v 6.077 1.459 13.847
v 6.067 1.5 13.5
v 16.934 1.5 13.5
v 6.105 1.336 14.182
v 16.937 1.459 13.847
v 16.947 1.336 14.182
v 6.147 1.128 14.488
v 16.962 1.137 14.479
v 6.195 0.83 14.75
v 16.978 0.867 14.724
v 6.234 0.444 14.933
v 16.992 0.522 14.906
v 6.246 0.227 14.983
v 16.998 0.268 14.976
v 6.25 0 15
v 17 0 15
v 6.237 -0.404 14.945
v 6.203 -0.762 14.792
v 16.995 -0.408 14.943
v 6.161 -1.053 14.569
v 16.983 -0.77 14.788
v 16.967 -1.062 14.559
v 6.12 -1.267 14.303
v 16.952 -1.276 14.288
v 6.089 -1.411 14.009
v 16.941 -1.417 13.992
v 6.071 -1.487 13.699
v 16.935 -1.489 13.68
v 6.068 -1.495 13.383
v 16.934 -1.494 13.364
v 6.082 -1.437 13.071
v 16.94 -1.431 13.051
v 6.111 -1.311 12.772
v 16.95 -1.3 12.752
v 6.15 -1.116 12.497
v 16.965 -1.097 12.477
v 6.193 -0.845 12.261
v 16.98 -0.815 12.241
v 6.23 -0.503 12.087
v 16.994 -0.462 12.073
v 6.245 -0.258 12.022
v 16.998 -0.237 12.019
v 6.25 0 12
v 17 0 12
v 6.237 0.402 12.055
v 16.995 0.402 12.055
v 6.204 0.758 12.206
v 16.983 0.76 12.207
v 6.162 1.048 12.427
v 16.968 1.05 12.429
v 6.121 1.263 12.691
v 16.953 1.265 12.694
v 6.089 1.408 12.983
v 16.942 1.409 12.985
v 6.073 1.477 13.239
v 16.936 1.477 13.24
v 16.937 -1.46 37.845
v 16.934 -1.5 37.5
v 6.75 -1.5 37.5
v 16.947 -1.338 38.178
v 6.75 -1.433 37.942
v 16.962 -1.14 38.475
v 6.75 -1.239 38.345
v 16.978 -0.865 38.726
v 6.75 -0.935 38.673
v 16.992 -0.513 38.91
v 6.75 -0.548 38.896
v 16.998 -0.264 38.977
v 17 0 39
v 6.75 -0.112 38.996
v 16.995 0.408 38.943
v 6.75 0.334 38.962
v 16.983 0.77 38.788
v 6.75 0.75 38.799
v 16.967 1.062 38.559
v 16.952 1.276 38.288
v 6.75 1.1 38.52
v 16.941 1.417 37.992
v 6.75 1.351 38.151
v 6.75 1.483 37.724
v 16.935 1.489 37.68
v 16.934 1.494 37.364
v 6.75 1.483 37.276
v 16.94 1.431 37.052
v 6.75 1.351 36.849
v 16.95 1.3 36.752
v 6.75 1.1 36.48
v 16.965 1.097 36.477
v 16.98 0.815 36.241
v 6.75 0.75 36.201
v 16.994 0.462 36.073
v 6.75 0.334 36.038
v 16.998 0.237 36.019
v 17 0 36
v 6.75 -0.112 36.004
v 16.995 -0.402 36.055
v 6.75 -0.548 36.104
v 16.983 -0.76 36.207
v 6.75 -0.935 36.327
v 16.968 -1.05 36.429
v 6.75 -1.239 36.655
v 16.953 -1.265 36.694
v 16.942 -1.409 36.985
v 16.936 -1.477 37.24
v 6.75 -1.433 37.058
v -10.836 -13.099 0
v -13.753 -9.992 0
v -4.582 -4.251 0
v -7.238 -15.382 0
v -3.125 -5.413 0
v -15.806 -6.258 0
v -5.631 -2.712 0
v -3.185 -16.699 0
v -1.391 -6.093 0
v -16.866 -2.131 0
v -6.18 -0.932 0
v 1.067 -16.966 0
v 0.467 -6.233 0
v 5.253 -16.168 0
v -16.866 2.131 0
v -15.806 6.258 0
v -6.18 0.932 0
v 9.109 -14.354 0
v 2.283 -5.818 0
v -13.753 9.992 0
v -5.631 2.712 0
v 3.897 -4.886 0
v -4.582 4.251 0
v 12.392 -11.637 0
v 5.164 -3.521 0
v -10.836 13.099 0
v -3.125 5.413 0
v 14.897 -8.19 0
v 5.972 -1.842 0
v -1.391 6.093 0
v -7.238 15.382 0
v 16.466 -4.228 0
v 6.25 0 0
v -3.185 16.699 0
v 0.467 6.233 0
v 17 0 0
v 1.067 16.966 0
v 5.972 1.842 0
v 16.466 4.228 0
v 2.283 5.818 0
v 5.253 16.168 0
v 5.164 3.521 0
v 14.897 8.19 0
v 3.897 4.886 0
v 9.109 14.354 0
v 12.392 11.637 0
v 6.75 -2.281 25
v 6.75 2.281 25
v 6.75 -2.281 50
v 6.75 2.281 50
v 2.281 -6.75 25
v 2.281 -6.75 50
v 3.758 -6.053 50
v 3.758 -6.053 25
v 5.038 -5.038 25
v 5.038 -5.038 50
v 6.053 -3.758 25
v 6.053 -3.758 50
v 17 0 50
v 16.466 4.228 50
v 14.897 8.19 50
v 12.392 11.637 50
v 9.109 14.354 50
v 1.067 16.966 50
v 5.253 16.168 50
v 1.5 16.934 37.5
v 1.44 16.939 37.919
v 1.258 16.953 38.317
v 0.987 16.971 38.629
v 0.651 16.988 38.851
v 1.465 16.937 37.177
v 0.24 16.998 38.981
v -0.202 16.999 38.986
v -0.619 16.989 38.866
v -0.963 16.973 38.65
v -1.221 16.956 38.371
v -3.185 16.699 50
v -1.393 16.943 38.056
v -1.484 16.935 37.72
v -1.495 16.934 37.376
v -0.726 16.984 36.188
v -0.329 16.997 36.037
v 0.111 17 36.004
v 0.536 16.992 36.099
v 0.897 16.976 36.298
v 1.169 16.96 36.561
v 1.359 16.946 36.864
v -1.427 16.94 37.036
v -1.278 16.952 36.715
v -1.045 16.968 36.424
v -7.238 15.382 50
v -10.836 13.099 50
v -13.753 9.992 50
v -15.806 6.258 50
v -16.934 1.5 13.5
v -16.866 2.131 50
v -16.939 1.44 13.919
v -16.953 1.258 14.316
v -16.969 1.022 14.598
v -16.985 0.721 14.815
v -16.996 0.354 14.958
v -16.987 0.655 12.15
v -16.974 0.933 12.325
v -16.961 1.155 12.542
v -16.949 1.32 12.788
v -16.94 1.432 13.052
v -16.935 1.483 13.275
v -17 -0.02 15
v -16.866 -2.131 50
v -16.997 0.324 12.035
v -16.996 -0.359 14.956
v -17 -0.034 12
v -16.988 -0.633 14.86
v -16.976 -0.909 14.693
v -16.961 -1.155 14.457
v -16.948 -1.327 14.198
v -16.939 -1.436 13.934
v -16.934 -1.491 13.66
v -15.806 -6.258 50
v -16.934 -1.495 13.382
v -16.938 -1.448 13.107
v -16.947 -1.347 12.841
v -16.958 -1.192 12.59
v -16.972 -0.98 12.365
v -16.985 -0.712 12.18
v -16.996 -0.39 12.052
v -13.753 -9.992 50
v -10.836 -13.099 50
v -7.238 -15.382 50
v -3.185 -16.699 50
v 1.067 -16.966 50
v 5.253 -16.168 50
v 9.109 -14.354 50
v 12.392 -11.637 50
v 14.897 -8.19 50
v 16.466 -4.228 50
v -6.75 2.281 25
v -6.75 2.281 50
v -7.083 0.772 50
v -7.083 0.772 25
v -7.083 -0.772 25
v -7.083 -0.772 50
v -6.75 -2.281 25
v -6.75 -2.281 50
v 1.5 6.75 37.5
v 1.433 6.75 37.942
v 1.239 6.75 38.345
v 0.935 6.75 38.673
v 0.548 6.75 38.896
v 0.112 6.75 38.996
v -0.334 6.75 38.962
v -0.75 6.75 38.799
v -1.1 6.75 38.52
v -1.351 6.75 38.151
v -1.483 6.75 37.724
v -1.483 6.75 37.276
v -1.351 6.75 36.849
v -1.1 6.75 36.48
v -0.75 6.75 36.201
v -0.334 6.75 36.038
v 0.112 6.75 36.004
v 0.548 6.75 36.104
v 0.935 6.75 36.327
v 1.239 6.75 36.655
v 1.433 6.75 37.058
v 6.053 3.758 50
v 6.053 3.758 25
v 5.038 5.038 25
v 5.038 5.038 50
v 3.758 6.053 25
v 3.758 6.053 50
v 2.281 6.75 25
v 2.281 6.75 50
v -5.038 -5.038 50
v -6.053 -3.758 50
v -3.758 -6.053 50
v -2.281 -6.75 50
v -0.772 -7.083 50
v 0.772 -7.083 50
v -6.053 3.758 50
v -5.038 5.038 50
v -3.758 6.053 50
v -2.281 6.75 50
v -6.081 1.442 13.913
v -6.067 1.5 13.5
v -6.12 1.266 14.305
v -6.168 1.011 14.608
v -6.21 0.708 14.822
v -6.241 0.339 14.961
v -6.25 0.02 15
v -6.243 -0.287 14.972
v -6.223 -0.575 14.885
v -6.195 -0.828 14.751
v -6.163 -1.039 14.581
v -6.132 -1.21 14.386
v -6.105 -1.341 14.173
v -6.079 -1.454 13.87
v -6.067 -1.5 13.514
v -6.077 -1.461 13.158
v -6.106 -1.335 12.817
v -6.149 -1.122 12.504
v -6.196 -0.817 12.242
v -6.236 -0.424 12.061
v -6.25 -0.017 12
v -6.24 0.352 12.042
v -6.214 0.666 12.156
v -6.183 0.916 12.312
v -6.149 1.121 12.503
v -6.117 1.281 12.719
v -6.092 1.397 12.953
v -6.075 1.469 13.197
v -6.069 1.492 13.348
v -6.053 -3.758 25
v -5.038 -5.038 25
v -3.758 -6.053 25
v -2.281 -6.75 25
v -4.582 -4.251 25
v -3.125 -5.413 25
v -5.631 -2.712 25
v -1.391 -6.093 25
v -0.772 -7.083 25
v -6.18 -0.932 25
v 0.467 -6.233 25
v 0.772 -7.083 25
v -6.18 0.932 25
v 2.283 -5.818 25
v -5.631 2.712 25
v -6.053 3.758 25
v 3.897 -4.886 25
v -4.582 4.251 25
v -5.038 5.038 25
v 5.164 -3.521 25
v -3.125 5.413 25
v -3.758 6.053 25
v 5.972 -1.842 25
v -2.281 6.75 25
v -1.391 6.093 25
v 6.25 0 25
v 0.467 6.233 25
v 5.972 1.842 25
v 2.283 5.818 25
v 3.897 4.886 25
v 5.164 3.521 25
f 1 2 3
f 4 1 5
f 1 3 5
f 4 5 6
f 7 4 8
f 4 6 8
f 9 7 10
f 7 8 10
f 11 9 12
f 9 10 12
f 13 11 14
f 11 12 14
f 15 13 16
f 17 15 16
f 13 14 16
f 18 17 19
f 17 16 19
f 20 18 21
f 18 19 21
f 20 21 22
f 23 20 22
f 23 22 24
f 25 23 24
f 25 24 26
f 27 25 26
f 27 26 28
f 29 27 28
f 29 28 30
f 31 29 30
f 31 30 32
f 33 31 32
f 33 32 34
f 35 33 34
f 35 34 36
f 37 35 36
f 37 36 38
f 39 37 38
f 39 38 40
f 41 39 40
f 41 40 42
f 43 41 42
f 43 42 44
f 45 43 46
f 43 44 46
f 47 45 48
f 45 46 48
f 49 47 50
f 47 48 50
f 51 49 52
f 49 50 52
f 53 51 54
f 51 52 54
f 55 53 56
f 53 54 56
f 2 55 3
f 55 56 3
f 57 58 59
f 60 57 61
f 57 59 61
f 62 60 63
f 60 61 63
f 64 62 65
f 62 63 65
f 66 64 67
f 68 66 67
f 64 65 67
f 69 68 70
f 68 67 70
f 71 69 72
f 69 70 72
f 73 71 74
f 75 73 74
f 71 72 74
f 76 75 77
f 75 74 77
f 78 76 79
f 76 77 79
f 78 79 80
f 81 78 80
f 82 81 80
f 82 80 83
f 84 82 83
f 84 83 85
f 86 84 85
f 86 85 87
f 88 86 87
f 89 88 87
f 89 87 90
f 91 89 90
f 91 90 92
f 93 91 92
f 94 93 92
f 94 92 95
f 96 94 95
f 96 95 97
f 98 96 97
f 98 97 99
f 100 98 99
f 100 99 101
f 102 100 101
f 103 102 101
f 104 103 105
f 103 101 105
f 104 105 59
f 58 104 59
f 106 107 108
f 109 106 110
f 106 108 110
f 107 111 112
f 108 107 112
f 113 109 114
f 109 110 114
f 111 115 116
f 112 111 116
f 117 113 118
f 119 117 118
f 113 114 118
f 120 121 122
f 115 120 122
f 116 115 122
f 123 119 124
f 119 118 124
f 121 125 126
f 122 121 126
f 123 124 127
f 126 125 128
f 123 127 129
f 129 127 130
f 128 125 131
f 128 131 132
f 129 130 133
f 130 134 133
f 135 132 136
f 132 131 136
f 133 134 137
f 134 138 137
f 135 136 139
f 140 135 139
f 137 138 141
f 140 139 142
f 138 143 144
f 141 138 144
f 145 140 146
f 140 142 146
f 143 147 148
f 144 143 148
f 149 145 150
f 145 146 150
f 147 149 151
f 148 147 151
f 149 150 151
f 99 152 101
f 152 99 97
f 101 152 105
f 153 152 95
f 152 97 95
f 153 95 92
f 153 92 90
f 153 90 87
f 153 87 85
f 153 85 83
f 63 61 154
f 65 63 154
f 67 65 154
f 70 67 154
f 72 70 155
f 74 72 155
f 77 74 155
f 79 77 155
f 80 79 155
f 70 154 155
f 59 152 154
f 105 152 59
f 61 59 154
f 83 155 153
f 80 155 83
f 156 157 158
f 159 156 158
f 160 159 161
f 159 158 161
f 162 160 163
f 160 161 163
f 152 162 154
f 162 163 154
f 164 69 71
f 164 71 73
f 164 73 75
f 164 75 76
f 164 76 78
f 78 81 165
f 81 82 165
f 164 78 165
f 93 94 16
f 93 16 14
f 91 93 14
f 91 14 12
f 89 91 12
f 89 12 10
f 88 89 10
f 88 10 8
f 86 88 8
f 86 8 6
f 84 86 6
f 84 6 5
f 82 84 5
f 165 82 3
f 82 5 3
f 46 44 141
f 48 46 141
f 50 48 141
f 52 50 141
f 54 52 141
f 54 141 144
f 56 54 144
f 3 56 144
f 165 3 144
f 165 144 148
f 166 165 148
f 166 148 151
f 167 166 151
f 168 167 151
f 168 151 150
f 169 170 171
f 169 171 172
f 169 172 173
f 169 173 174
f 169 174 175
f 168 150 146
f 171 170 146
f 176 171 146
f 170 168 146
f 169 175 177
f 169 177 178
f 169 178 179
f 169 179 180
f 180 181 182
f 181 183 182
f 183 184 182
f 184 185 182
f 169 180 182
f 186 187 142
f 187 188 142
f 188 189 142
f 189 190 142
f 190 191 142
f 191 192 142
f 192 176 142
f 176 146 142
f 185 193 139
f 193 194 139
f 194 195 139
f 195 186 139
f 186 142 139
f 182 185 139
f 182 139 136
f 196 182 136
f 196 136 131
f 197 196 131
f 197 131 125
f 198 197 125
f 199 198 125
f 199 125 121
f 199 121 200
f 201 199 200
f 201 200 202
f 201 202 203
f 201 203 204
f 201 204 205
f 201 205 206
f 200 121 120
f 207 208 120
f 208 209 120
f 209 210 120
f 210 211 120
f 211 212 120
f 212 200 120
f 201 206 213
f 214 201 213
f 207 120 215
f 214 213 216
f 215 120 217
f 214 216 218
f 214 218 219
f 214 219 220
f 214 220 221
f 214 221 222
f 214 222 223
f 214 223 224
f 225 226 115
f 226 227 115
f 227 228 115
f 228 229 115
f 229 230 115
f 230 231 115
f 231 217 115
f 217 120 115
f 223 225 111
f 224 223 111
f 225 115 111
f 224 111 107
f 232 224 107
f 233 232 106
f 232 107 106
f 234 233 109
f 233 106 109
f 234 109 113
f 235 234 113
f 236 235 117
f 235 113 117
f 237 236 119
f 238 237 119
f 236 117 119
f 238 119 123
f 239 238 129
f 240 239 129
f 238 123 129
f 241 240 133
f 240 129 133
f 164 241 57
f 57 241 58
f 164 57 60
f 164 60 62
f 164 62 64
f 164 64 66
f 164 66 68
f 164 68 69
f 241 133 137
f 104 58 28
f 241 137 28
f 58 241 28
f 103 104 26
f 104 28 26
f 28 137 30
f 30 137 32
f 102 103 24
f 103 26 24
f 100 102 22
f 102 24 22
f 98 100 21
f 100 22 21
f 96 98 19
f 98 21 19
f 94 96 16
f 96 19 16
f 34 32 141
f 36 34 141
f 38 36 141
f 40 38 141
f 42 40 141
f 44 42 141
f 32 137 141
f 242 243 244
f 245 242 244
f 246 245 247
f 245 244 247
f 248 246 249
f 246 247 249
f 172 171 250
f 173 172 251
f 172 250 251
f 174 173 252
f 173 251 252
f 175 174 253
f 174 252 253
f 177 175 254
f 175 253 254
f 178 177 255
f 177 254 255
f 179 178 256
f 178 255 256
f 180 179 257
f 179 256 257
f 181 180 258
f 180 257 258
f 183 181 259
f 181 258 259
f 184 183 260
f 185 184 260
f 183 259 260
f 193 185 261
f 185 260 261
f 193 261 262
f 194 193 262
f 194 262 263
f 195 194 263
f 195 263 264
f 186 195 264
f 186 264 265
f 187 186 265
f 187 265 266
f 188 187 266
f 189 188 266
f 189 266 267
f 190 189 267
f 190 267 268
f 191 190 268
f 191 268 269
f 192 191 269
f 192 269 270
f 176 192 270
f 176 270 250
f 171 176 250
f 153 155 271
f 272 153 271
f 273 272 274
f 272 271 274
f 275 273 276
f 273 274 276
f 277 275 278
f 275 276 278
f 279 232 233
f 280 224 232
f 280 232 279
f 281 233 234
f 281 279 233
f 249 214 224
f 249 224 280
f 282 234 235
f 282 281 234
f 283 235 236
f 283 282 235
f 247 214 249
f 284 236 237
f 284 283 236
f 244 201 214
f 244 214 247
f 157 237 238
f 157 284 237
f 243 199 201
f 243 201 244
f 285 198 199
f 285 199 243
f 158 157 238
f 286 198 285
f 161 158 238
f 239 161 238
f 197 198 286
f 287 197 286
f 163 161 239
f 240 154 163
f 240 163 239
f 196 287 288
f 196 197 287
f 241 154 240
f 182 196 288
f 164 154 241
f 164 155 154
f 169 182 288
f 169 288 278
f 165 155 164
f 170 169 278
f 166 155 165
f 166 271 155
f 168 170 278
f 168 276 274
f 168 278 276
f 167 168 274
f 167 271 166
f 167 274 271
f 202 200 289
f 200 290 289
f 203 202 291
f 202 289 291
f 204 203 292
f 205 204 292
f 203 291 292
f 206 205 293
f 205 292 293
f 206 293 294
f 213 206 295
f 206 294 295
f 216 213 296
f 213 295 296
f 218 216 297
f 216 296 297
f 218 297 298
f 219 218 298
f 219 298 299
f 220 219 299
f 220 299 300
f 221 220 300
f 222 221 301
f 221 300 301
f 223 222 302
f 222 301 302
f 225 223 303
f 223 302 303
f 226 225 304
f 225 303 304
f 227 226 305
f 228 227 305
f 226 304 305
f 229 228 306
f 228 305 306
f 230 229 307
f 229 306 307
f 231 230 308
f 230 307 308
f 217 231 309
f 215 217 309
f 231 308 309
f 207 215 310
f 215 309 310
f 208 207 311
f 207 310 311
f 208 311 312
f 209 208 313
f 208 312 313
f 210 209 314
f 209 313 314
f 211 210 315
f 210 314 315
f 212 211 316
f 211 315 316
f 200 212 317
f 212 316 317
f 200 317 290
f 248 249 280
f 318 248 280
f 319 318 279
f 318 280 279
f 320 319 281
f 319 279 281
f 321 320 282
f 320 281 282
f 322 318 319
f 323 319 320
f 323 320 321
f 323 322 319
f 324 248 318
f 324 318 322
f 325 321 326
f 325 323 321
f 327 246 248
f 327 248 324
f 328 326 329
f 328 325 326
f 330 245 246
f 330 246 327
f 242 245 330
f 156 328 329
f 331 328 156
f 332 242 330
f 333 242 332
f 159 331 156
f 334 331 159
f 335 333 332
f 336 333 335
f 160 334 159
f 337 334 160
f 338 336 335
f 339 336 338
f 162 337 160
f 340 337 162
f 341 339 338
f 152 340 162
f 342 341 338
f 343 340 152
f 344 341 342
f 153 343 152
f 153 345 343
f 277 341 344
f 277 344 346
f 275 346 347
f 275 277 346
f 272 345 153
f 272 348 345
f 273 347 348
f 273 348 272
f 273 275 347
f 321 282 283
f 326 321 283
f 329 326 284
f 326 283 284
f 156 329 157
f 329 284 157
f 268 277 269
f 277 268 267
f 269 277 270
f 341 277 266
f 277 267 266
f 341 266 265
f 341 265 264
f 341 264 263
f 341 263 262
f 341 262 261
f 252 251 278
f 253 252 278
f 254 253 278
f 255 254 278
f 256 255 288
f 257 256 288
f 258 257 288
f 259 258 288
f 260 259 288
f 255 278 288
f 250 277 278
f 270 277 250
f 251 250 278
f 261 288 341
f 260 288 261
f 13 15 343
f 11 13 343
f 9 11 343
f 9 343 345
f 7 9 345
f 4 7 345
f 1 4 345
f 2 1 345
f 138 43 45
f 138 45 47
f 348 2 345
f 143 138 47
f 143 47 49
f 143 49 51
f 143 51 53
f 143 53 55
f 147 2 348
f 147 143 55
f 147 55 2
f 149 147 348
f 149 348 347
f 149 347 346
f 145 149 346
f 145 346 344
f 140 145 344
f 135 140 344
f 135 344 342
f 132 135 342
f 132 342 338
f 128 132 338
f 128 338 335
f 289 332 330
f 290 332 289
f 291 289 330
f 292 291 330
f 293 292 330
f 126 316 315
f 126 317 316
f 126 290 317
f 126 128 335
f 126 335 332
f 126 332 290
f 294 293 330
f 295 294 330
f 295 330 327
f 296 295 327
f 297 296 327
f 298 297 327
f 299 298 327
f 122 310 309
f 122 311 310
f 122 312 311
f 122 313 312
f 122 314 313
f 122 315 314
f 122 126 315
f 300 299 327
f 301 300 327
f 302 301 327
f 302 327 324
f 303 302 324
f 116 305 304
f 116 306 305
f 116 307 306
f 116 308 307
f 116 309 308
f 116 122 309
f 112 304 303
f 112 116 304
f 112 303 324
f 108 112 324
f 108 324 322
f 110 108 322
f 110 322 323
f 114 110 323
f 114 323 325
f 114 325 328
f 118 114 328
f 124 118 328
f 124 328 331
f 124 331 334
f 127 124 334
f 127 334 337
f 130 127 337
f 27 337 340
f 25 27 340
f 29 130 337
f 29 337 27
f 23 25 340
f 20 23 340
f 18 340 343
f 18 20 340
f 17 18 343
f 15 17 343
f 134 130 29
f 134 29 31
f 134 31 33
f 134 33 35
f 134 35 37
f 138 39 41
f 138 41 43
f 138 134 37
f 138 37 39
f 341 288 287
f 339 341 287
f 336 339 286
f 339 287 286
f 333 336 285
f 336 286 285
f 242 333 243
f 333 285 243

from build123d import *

# Parameters (mm, degrees)
F0_R      = 17
F0_R_2    = 6.25
F1_DEPTH  = 50
F3_DEPTH  = 25
F4_DEPTH  = 25
F5_R      = 1.5
F6_DEPTH  = 25
F7_R      = 1.5
F8_DEPTH  = 25
F9_R      = 1.5
F10_DEPTH = 50


with BuildPart() as f1:
    # F0 (on Top) → F1 (new body)
    with BuildSketch(Plane.XY):
        Circle(F0_R)
        Circle(F0_R_2, mode=Mode.SUBTRACT)
        Circle(F0_R_2)
    extrude(amount=F1_DEPTH)

    # F0 (on Top) → F3 (cut)
    with BuildSketch(Plane.XY):
        Circle(F0_R_2)
    extrude(amount=F3_DEPTH, mode=Mode.SUBTRACT)

    # F2 (on face) → F4 (cut)
    with BuildSketch(Plane.XY.offset(50)):
        with BuildLine():
            Line((6.75, -2.2810359489), (6.75, 2.2810359489))
            ThreePointArc((6.75, 2.2810359489), (5.038135816, 5.038135816), (2.2810359489, 6.75))
            Line((2.2810359489, 6.75), (-2.2810359489, 6.75))
            ThreePointArc((-2.2810359489, 6.75), (-5.038135816, 5.038135816), (-6.75, 2.2810359489))
            Line((-6.75, 2.2810359489), (-6.75, -2.2810359489))
            ThreePointArc((-6.75, -2.2810359489), (-5.038135816, -5.038135816), (-2.2810359489, -6.75))
            Line((-2.2810359489, -6.75), (2.2810359489, -6.75))
            ThreePointArc((2.2810359489, -6.75), (5.038135816, -5.038135816), (6.75, -2.2810359489))
        make_face()
        with BuildLine():
            Line((-6.75, -2.2810359489), (-6.75, 2.2810359489))
            ThreePointArc((-6.75, 2.2810359489), (-7.125, 0), (-6.75, -2.2810359489))
        make_face()
        with BuildLine():
            ThreePointArc((-2.2810359489, -6.75), (0, -7.125), (2.2810359489, -6.75))
            Line((2.2810359489, -6.75), (-2.2810359489, -6.75))
        make_face()
    extrude(amount=-F4_DEPTH, mode=Mode.SUBTRACT)

    # F5 (on face) → F6 (cut)
    with BuildSketch(Plane(origin=(6.75, 0, 0), x_dir=(0, -1, 0), z_dir=(-1, 0, 0))):
        with Locations((0, 37.5)):
            Circle(F5_R)
    extrude(amount=-F6_DEPTH, mode=Mode.SUBTRACT)

    # F7 (on face) → F8 (cut)
    with BuildSketch(Plane.XZ.offset(-6.75)):
        with Locations((0, 37.5)):
            Circle(F7_R)
    extrude(amount=-F8_DEPTH, mode=Mode.SUBTRACT)

    # F9 (on Right) → F10 (cut, symmetric)
    with BuildSketch(Plane.YZ):
        with Locations((0, 13.5)):
            Circle(F9_R)
    extrude(amount=F10_DEPTH, both=True, mode=Mode.SUBTRACT)


solid = f1.part
